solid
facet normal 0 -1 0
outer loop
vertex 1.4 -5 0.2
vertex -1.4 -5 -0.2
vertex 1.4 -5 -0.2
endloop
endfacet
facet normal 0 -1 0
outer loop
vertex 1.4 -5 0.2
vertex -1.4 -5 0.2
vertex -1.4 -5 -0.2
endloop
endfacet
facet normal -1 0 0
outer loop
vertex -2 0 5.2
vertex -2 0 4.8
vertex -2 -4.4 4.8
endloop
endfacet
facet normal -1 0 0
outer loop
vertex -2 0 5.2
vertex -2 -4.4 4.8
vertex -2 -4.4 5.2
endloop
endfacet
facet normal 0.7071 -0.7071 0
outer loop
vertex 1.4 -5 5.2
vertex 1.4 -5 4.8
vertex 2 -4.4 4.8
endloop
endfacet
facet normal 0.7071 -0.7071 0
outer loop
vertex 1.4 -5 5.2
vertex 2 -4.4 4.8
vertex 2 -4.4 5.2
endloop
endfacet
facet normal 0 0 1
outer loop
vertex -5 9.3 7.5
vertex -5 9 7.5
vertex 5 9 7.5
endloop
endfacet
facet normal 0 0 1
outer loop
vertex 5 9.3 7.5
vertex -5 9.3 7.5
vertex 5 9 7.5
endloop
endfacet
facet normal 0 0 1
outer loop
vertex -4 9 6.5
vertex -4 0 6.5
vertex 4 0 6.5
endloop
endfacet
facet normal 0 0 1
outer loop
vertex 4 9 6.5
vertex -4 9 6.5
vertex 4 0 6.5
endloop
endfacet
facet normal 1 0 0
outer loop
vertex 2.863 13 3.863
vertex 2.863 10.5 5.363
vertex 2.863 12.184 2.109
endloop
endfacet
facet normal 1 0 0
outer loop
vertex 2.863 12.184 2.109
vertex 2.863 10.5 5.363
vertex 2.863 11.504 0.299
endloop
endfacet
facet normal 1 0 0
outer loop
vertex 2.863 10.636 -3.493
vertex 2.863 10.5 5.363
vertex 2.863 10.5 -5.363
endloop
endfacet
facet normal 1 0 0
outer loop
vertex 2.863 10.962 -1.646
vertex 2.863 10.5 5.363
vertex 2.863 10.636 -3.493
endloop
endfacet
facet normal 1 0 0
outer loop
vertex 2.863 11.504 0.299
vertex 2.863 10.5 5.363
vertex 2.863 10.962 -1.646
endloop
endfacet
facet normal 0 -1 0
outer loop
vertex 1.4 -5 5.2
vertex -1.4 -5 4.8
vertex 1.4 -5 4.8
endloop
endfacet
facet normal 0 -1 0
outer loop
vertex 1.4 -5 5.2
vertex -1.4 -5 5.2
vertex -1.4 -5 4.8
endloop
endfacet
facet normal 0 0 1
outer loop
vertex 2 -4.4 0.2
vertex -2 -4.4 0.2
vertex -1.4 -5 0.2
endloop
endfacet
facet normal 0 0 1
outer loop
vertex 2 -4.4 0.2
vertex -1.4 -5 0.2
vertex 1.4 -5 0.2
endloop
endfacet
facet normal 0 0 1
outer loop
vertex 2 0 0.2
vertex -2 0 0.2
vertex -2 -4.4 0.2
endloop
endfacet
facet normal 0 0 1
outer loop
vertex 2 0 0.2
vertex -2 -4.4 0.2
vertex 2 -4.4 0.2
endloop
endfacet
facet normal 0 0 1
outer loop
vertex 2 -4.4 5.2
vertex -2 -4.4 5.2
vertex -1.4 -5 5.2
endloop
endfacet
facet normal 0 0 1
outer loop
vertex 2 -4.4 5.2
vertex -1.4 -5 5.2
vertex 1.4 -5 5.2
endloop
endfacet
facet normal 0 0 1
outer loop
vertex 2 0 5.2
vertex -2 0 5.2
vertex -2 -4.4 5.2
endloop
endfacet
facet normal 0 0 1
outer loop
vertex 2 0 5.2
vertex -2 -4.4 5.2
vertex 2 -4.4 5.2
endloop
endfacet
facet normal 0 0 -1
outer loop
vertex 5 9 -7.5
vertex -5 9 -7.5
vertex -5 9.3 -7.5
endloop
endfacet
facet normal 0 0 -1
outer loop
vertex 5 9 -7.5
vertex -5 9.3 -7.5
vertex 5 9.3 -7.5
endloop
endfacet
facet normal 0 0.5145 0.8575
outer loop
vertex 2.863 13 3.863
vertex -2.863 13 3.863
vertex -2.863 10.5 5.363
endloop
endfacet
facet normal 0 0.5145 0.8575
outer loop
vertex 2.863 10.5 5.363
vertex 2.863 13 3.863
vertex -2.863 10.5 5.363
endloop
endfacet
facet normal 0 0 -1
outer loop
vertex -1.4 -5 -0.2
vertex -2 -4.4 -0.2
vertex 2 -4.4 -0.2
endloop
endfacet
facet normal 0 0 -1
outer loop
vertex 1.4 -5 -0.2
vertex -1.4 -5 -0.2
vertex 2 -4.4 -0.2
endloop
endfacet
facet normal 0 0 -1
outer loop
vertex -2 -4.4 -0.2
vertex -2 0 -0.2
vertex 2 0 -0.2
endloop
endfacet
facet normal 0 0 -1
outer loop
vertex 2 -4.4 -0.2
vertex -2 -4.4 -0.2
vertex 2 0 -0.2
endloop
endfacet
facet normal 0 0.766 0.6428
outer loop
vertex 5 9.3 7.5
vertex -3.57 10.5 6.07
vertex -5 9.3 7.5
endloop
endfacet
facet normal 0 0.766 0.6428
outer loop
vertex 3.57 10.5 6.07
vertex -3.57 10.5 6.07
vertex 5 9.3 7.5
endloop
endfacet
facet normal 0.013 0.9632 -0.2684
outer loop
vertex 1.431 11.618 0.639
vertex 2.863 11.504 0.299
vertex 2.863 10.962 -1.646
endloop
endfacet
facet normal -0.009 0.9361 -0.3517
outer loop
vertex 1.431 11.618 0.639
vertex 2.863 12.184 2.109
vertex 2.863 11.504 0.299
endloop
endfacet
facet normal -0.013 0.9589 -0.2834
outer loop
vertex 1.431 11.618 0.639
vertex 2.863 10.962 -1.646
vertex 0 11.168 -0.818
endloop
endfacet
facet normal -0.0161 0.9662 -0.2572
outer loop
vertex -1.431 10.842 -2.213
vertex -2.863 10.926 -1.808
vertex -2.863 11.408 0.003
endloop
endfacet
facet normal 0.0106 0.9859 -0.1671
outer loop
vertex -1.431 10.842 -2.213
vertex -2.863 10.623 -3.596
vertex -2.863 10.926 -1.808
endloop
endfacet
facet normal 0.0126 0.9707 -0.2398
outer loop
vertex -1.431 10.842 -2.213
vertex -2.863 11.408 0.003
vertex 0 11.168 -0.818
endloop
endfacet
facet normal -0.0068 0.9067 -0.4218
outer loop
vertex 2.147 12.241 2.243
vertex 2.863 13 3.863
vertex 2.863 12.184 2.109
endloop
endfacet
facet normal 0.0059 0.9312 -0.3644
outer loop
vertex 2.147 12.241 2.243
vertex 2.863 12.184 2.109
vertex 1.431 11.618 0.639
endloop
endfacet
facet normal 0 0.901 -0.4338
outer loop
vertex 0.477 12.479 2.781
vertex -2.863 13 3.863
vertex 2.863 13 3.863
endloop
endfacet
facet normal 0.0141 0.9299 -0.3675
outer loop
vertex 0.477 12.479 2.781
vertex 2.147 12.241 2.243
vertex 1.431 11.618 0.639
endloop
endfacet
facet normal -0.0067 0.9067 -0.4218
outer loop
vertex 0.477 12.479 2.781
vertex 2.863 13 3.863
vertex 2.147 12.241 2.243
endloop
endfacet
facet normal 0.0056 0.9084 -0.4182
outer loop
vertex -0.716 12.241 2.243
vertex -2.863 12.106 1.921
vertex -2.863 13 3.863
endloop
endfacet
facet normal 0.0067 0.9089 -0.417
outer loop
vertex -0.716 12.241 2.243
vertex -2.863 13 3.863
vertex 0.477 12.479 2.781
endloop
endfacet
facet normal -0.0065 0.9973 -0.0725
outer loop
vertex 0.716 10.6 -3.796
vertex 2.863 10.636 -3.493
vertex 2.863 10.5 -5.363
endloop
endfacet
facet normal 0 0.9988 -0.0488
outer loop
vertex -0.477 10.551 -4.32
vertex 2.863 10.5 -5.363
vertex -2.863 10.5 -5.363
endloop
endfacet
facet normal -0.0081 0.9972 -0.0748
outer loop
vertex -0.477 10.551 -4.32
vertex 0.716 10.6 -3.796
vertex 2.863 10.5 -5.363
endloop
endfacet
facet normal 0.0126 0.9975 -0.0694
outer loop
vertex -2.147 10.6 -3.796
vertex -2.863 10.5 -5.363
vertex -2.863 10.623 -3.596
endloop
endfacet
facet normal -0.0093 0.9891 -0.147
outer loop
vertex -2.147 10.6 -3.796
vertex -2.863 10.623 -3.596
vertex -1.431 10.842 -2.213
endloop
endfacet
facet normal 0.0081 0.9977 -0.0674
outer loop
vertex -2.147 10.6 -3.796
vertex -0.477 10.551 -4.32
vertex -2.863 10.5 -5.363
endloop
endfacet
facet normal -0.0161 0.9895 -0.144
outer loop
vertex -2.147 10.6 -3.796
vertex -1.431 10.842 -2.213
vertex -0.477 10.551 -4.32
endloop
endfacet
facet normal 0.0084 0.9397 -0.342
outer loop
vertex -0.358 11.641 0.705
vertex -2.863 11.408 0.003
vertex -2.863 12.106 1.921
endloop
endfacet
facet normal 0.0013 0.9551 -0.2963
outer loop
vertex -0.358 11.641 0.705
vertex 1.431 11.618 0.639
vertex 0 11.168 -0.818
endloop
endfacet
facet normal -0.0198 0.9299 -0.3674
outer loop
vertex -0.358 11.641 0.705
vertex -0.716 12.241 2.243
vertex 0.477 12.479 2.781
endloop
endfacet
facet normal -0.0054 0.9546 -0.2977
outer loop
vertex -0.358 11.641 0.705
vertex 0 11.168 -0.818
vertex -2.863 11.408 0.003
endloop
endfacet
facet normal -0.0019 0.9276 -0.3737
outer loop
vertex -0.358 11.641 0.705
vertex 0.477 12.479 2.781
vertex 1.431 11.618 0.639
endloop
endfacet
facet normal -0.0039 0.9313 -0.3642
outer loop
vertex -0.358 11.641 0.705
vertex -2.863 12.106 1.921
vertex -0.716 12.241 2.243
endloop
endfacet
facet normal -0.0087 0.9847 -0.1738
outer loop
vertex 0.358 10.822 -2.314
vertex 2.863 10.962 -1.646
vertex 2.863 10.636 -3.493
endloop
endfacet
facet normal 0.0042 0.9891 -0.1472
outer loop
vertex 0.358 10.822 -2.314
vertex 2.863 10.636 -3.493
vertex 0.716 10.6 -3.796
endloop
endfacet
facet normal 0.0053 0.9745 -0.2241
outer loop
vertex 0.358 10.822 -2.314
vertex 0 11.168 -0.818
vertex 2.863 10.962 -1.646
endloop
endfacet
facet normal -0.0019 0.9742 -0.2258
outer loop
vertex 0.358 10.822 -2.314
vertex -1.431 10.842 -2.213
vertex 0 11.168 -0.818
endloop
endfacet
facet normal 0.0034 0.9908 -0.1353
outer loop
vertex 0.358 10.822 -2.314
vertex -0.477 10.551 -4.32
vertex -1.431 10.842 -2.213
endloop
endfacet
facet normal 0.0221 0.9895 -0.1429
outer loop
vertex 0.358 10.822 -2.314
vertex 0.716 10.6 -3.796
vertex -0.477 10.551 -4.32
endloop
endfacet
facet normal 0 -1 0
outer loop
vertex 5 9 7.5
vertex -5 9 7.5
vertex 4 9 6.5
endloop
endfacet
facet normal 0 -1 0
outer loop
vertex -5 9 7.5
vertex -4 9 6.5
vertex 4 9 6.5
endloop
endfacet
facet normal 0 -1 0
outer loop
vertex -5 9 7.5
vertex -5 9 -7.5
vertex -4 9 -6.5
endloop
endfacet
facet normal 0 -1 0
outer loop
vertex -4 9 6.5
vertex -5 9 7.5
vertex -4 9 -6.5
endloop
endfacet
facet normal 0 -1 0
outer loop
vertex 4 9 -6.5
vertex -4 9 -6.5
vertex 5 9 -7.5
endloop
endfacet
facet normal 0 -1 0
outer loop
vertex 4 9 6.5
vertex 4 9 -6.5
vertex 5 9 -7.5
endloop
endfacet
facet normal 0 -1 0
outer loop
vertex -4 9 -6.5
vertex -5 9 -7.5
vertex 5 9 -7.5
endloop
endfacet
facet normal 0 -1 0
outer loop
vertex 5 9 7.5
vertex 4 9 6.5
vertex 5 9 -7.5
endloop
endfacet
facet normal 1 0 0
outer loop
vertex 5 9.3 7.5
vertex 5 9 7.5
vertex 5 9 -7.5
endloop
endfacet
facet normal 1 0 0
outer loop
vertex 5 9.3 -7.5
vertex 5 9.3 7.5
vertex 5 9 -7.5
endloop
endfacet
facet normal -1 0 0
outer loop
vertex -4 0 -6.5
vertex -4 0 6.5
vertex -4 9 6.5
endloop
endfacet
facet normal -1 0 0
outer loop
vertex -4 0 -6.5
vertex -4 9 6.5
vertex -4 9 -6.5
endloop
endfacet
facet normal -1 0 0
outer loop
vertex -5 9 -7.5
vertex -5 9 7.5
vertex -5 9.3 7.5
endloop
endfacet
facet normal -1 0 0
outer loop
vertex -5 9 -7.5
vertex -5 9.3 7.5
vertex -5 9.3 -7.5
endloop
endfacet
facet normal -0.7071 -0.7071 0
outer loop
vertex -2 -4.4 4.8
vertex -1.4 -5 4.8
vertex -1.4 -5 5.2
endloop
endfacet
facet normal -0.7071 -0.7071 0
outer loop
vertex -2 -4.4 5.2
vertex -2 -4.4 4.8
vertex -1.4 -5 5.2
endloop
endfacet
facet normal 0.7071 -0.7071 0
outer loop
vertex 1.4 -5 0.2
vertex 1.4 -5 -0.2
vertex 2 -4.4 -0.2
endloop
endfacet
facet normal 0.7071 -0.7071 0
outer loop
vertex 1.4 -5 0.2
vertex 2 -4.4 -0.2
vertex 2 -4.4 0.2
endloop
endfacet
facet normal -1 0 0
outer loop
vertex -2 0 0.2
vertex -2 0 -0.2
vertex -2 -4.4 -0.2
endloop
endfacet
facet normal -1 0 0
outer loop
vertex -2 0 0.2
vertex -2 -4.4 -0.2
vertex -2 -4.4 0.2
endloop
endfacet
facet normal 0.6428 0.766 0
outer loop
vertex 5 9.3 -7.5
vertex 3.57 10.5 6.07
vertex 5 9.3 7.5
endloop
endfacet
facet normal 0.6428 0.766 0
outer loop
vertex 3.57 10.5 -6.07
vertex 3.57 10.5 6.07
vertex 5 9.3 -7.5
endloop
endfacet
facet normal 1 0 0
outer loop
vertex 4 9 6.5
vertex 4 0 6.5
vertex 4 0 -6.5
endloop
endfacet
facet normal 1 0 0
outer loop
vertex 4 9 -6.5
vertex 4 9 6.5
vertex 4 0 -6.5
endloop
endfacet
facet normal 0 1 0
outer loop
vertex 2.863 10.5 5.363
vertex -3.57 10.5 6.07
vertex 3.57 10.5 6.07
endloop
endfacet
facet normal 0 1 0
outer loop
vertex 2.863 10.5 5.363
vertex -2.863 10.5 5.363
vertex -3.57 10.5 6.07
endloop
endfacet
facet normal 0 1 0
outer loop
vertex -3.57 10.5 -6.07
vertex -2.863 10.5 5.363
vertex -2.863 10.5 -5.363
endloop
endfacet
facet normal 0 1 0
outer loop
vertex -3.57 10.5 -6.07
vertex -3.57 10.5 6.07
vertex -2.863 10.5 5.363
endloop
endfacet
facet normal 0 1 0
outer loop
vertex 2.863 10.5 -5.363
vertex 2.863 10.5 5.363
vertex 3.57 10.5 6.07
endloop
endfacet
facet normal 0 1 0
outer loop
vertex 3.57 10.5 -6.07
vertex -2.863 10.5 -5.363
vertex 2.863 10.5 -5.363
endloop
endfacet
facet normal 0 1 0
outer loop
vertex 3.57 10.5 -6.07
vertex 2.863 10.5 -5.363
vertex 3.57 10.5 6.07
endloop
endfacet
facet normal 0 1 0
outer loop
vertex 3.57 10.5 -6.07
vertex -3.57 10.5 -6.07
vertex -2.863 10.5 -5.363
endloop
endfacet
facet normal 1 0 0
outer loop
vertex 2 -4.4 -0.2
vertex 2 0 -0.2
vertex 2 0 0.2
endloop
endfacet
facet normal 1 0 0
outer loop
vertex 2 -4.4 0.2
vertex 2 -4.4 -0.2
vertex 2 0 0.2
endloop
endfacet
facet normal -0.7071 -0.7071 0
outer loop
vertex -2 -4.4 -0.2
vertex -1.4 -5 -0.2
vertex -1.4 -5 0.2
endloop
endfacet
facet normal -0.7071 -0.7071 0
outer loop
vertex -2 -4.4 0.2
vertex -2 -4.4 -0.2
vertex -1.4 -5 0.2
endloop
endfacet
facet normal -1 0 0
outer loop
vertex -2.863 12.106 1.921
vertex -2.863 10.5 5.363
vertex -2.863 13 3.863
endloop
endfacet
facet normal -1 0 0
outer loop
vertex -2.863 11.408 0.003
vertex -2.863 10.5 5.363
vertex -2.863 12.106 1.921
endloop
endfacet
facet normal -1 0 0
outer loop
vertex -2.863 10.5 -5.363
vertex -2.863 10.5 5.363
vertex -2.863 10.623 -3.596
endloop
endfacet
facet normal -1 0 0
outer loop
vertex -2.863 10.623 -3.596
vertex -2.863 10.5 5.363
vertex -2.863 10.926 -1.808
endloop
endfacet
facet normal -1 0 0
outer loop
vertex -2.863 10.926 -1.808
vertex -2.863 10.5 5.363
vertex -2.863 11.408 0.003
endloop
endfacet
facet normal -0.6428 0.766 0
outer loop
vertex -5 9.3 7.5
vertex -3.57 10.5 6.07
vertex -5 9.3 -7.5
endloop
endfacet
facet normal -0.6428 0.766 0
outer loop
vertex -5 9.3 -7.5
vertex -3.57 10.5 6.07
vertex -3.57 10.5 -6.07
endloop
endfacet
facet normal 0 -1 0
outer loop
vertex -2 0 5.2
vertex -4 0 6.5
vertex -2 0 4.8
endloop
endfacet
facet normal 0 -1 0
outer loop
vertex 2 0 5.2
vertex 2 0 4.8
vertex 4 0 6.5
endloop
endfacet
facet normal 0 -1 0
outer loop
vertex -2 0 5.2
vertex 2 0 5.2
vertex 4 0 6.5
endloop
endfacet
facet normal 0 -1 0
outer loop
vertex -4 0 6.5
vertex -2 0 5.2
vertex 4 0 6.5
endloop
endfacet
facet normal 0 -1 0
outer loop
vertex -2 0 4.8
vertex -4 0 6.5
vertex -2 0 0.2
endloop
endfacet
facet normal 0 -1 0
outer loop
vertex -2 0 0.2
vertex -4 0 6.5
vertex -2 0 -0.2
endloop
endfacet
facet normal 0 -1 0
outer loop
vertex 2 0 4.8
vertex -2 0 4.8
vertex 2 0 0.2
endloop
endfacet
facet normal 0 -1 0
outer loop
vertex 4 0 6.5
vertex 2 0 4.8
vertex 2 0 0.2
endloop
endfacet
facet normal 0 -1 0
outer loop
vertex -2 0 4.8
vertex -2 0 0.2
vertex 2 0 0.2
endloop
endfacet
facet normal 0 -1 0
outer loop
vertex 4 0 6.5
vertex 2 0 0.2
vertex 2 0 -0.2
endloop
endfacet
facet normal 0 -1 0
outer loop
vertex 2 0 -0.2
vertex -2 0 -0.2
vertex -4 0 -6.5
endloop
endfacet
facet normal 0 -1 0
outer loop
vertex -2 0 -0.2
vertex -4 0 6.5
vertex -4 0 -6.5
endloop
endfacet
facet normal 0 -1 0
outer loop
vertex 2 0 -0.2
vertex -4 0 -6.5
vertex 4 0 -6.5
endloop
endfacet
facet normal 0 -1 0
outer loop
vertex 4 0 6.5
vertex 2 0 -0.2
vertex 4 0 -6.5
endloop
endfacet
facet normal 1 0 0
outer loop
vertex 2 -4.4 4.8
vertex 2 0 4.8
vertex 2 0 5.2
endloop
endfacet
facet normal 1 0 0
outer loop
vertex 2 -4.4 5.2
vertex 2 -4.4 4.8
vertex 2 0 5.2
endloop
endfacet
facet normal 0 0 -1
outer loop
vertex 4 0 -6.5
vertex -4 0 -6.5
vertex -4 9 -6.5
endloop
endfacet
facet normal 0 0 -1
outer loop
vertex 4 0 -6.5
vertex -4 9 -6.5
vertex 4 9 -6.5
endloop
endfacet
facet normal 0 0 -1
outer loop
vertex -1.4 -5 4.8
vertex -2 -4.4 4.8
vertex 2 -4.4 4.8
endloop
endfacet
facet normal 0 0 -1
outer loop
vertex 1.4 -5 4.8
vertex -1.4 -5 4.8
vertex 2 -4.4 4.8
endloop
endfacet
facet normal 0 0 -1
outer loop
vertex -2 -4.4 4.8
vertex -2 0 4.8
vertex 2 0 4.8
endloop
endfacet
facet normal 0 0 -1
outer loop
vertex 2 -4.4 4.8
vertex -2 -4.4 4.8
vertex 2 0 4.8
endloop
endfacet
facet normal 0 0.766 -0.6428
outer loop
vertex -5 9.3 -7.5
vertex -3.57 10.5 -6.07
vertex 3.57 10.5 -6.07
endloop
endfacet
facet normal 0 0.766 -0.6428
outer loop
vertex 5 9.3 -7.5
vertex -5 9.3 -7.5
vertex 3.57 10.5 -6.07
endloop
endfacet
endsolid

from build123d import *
from OCP.BRepFilletAPI import BRepFilletAPI_MakeChamfer

# Parameters (mm, degrees)
SKETCH1_W           = 8
SKETCH1_H           = 13
BOSS_EXTRUDE1_DEPTH = 9
SKETCH2_W           = 10
SKETCH2_H           = 15
BOSS_EXTRUDE2_DEPTH = 1.5
CHAMFER1_SIZE       = 1.2
CHAMFER1_SIZE2      = 1.430104311
SKETCH3_W           = 5.725577816
SKETCH3_H           = 10.725577816
BOSS_EXTRUDE3_DEPTH = 2.5
CUT_EXTRUDE2_DEPTH  = 10
CUT_EXTRUDE3_DEPTH  = 10
SKETCH6_W           = 4
SKETCH6_H           = 0.4
BOSS_EXTRUDE4_DEPTH = 5
CHAMFER2_SIZE       = 0.6
LPATTERN1_COUNT     = 2
LPATTERN1_PITCH     = 5
CHAMFER3_SIZE       = 0.6


with BuildPart() as part:
    # Sketch1 → Boss-Extrude1 (new body)
    with BuildSketch(Plane(origin=(0, 0, 0), x_dir=(1, 0, 0), z_dir=(0, 1, 0))):
        Rectangle(SKETCH1_W, SKETCH1_H)
    extrude(amount=BOSS_EXTRUDE1_DEPTH)

    # Sketch2 → Boss-Extrude2 (add)
    with BuildSketch(Plane(origin=(0, 9, 0), x_dir=(1, 0, 0), z_dir=(0, 1, 0))):
        Rectangle(SKETCH2_W, SKETCH2_H)
    extrude(amount=BOSS_EXTRUDE2_DEPTH)

    # Chamfer1: one chamfer whose edges measure the first distance from different faces: ONE call of the kernel's chamfer builder (chamfer() names one face for all edges)
    chamfer1_edges_1 = [part.edges().sort_by_distance(p)[0] for p in [
        (5, 10.5, 0),
    ]]
    chamfer1_side_1 = [part.faces().sort_by_distance(p)[0] for p in [
        (5, 9.75, 0),
    ]]
    chamfer1_edges_2 = [part.edges().sort_by_distance(p)[0] for p in [
        (0, 10.5, -7.5),
    ]]
    chamfer1_side_2 = [part.faces().sort_by_distance(p)[0] for p in [
        (0, 9.75, -7.5),
    ]]
    chamfer1_edges_3 = [part.edges().sort_by_distance(p)[0] for p in [
        (-5, 10.5, 0),
    ]]
    chamfer1_side_3 = [part.faces().sort_by_distance(p)[0] for p in [
        (-5, 9.75, 0),
    ]]
    chamfer1_edges_4 = [part.edges().sort_by_distance(p)[0] for p in [
        (0, 10.5, 7.5),
    ]]
    chamfer1_side_4 = [part.faces().sort_by_distance(p)[0] for p in [
        (0, 9.75, 7.5),
    ]]
    chamfer1 = BRepFilletAPI_MakeChamfer(part.part.solid().wrapped)
    for e in chamfer1_edges_1:
        chamfer1.Add(CHAMFER1_SIZE, CHAMFER1_SIZE2, e.wrapped, chamfer1_side_1[0].wrapped)  # the first distance lies on this face
    for e in chamfer1_edges_2:
        chamfer1.Add(CHAMFER1_SIZE, CHAMFER1_SIZE2, e.wrapped, chamfer1_side_2[0].wrapped)  # the first distance lies on this face
    for e in chamfer1_edges_3:
        chamfer1.Add(CHAMFER1_SIZE, CHAMFER1_SIZE2, e.wrapped, chamfer1_side_3[0].wrapped)  # the first distance lies on this face
    for e in chamfer1_edges_4:
        chamfer1.Add(CHAMFER1_SIZE, CHAMFER1_SIZE2, e.wrapped, chamfer1_side_4[0].wrapped)  # the first distance lies on this face
    add(Compound.cast(chamfer1.Shape()), mode=Mode.REPLACE)

    # Sketch3 → Boss-Extrude3 (add)
    with BuildSketch(Plane(origin=(0, 10.5, 0), x_dir=(1, 0, 0), z_dir=(0, 1, 0))):
        Rectangle(SKETCH3_W, SKETCH3_H)
    extrude(amount=BOSS_EXTRUDE3_DEPTH)

    # Sketch4 → Cut-Extrude2 (cut)
    with BuildSketch(Plane.ZY.offset(2.862788908)):
        Polygon((5.362788908, 13), (3.862788908, 13), (5.362788908, 10.5), align=None)
    extrude(amount=-CUT_EXTRUDE2_DEPTH, mode=Mode.SUBTRACT)

    # Sketch5 → Cut-Extrude3 (cut)
    with BuildSketch(Plane.ZY.offset(2.862788908)):
        with BuildLine():
            Line((-5.362788908, 10.5), (-5.362788908, 13))
            Line((-5.362788908, 13), (3.862788908, 13))
            add(Edge.make_bspline(
                [(3.862788908, 13), (-0.886352769, 10.585649202), (-5.362788908, 10.5)],
                knots=[0, 0, 0, 0.869788285, 0.869788285, 0.869788285], degree=2))
        make_face()
    extrude(amount=-CUT_EXTRUDE3_DEPTH, mode=Mode.SUBTRACT)

    # Sketch6 → Boss-Extrude4 (add)
    with BuildSketch(Plane.XZ):
        with Locations((0, 5)):
            Rectangle(SKETCH6_W, SKETCH6_H)
    boss_extrude4 = extrude(amount=BOSS_EXTRUDE4_DEPTH)

    # Chamfer2
    chamfer2_edges = [part.edges().sort_by_distance(p)[0] for p in [
        (2, -5, 5),
        (-2, -5, 5),
    ]]
    chamfer(chamfer2_edges, length=CHAMFER2_SIZE)

    # LPattern1: Boss-Extrude4 ×2
    with Locations(*[(0, 0, -i * LPATTERN1_PITCH) for i in range(1, LPATTERN1_COUNT)]):
        add(boss_extrude4)

    # Chamfer3
    chamfer3_edges = [part.edges().sort_by_distance(p)[0] for p in [
        (2, -5, 0),
        (-2, -5, 0),
    ]]
    chamfer(chamfer3_edges, length=CHAMFER3_SIZE)


solid = part.part
